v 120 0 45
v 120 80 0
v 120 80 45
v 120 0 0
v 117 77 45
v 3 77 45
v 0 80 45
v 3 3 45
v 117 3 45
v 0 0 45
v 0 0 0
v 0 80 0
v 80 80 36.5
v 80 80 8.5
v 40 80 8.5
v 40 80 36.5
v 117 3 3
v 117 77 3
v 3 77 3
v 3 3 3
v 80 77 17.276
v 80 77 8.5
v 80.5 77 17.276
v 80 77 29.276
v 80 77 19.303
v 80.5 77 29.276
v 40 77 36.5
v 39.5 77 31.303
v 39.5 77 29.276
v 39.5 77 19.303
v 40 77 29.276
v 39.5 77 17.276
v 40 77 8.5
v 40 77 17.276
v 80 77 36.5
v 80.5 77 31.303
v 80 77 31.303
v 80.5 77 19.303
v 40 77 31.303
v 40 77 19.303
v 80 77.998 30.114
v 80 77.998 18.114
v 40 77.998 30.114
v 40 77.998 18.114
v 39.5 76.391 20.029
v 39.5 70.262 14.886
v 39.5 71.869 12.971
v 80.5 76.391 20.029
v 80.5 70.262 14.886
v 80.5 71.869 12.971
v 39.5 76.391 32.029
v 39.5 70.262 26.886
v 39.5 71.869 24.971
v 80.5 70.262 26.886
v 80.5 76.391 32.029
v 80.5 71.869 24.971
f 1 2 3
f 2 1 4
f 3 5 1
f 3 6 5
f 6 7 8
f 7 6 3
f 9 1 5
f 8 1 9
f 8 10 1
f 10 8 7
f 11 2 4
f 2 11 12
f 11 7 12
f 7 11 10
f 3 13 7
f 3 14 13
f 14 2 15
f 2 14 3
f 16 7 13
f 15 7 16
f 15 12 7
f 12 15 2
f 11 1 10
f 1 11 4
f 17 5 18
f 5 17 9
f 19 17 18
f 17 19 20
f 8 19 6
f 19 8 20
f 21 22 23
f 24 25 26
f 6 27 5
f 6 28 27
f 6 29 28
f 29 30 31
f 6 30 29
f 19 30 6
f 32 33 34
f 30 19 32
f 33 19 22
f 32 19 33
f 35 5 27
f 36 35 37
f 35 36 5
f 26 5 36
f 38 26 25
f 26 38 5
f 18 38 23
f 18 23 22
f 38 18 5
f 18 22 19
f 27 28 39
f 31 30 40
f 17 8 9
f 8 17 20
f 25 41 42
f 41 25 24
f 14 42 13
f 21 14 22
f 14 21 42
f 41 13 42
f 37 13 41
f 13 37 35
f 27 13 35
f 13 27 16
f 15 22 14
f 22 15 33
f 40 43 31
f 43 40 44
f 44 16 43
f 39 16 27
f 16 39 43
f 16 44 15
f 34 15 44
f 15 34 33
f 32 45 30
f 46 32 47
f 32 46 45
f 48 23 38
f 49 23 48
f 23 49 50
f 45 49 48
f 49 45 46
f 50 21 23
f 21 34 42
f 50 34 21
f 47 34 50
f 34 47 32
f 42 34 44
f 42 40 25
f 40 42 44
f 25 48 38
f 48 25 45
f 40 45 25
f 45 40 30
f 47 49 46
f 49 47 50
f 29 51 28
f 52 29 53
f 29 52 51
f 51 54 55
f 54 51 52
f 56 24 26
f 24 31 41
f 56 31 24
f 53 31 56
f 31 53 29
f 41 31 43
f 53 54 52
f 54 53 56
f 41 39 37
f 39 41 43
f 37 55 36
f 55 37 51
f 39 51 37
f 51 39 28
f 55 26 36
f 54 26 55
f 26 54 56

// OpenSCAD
$fn = 32;

// ----------------------------------------------------------------------
// Vent box: louvers enclosure
// ----------------------------------------------------------------------

// --- parameters (mm) ---
box_l = 120;              // box length, X
box_w = 80;               // box width, Y
box_h = 45;               // box height, Z
wall_t = 3;               // shell wall thickness
win_l = 40;               // vent window width, X
win_h = 28;               // vent window height, Z
slat_t = 2.5;             // louver slat thickness
slat_d = 8;               // louver slat depth
slat_a = 40;              // louver slat angle, degrees
slat_pitch = 12;          // louver pitch
slat_yc = 74.13;          // slat centreline Y

win_z0 = (box_h - win_h) / 2;  // window lower edge Z
n_slats = 2;  // louver count
slat_z0 = win_z0 + (win_h - (n_slats - 1) * slat_pitch) / 2;

difference() {
  union() {
    difference() {
      cube([box_l, box_w, box_h]);
  translate([wall_t, wall_t, wall_t])
    cube([box_l - 2 * wall_t, box_w - 2 * wall_t, box_h]);
  translate([(box_l - win_l) / 2, box_w - wall_t - 1, win_z0])
    cube([win_l, wall_t + 2, win_h]);
    }
    for (i = [0 : n_slats - 1])
      translate([box_l / 2, slat_yc, slat_z0 + i * slat_pitch])
        rotate([slat_a, 0, 0])
          cube([win_l + 1, slat_d, slat_t], center = true);
  }
}
